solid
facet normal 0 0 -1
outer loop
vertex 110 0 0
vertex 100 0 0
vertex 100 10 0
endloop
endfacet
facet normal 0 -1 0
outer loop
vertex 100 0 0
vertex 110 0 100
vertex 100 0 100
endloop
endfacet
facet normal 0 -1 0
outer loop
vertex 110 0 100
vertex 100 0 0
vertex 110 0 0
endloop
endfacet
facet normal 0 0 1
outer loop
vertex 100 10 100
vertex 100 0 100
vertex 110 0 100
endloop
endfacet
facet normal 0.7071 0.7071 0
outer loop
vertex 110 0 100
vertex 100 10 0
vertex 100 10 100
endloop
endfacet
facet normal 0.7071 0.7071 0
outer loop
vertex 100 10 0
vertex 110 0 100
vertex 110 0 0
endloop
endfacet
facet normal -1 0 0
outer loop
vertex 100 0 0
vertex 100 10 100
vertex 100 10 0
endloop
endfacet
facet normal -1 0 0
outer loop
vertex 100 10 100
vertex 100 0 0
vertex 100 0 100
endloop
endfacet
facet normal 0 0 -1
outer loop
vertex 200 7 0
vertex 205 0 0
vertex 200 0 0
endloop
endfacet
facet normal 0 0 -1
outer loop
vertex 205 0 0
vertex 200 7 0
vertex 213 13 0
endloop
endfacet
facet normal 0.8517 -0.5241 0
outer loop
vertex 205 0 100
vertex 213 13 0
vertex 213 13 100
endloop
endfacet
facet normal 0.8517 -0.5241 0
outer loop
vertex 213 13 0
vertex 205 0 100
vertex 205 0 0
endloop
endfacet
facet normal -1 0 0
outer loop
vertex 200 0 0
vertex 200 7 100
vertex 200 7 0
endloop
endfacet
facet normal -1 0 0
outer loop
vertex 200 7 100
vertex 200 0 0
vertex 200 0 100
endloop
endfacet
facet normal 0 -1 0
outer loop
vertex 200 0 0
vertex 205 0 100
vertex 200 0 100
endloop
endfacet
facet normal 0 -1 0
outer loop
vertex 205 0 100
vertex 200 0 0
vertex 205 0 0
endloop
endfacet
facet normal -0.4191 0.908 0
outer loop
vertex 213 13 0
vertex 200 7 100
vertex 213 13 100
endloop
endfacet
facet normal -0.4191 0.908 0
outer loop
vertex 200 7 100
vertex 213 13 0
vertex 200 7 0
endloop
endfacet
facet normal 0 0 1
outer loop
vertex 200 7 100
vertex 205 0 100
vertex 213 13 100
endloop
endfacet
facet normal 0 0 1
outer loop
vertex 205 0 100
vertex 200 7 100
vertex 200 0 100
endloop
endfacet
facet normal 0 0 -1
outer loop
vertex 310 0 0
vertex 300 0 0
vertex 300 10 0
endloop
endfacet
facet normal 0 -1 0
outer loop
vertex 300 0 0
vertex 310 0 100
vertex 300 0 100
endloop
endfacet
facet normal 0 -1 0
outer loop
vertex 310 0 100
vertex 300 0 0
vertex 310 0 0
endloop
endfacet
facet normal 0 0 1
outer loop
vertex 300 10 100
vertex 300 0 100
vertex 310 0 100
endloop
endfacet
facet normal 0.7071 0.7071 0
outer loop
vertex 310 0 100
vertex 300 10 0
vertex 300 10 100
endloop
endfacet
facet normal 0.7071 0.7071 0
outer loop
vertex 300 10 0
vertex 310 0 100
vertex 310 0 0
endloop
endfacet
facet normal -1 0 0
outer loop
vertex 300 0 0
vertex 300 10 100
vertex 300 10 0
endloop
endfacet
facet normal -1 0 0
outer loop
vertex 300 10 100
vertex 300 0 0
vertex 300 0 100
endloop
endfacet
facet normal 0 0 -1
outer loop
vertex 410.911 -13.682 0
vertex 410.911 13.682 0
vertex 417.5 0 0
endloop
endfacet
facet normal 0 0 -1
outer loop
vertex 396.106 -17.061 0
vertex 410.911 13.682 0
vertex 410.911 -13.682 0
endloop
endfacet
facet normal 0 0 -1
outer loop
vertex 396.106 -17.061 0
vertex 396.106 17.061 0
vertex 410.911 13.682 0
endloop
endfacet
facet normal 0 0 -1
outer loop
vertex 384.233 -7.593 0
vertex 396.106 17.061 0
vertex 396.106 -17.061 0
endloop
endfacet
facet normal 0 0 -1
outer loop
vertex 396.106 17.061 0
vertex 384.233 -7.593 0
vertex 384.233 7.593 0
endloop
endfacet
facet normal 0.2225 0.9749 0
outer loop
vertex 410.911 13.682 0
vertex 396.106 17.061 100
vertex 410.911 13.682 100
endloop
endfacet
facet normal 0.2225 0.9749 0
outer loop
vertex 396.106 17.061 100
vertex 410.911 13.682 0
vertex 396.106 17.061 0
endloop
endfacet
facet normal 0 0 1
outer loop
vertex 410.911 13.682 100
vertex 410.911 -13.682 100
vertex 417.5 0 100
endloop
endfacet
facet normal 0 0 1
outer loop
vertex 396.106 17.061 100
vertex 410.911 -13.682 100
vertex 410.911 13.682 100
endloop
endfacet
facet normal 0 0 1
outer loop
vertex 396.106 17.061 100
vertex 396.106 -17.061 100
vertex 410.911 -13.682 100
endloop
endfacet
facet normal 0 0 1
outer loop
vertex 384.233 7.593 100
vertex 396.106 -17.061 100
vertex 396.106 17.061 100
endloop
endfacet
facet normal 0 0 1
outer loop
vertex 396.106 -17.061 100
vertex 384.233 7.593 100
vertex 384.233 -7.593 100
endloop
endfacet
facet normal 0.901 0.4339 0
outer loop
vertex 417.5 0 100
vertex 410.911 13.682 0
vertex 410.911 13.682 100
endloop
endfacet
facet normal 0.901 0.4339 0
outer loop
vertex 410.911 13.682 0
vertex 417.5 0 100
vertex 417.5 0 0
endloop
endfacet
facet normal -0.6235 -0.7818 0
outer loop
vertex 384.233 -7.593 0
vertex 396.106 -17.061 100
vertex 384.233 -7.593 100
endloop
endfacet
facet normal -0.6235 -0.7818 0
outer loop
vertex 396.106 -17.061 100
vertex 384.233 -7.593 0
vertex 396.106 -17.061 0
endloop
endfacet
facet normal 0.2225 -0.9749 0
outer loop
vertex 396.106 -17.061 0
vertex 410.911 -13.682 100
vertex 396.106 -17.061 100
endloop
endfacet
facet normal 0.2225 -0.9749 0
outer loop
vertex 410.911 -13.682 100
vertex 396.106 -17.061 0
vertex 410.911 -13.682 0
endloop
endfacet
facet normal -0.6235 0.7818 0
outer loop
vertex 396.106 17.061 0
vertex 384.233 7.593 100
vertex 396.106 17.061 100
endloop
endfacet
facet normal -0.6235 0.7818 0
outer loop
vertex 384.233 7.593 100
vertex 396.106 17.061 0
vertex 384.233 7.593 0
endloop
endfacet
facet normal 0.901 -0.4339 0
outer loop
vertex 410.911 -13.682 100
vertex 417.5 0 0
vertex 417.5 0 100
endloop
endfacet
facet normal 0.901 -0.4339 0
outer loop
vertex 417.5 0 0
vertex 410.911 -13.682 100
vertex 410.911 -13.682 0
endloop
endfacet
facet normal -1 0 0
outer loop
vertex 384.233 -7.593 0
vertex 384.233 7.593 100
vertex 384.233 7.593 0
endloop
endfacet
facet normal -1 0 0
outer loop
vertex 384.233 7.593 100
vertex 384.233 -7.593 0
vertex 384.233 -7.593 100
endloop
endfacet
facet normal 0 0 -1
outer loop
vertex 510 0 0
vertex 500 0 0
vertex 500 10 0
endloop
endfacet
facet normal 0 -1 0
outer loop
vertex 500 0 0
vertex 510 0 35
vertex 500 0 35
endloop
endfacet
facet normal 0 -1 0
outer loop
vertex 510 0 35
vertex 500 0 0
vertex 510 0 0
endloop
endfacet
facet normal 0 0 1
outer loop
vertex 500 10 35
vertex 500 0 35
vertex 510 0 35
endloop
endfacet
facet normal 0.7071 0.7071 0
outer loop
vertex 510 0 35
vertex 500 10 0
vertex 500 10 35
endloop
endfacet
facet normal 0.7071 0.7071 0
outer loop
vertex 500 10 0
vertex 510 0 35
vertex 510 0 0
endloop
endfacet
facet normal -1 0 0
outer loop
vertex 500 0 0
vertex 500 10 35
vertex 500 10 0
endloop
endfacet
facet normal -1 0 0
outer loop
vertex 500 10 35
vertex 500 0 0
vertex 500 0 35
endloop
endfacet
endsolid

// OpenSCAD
translate([100.0,0.0,0.0]){linear_extrude(100.0000){polygon(points=[[10.0,0.0],[0.0,10.0],[0.0,0.0]]);}}translate([200.0,0.0,0.0]){linear_extrude(100.0000){polygon(points=[[0.0,0.0],[5.0,0.0],[13.0,13.0],[0.0,7.0]]);}}translate([300.0,0.0,0.0]){linear_extrude(100.0000){polygon(points=[[10.0,0.0],[0.0,10.0],[0.0,0.0]]);}}translate([400.0,0.0,0.0]){linear_extrude(100.0000){circle(d=35.0000, $fn=7.0000);}}translate([500.0,0.0,0.0]){linear_extrude(35.0000){polygon(points=[[10.0,0.0],[0.0,10.0],[0.0,0.0]]);}}
